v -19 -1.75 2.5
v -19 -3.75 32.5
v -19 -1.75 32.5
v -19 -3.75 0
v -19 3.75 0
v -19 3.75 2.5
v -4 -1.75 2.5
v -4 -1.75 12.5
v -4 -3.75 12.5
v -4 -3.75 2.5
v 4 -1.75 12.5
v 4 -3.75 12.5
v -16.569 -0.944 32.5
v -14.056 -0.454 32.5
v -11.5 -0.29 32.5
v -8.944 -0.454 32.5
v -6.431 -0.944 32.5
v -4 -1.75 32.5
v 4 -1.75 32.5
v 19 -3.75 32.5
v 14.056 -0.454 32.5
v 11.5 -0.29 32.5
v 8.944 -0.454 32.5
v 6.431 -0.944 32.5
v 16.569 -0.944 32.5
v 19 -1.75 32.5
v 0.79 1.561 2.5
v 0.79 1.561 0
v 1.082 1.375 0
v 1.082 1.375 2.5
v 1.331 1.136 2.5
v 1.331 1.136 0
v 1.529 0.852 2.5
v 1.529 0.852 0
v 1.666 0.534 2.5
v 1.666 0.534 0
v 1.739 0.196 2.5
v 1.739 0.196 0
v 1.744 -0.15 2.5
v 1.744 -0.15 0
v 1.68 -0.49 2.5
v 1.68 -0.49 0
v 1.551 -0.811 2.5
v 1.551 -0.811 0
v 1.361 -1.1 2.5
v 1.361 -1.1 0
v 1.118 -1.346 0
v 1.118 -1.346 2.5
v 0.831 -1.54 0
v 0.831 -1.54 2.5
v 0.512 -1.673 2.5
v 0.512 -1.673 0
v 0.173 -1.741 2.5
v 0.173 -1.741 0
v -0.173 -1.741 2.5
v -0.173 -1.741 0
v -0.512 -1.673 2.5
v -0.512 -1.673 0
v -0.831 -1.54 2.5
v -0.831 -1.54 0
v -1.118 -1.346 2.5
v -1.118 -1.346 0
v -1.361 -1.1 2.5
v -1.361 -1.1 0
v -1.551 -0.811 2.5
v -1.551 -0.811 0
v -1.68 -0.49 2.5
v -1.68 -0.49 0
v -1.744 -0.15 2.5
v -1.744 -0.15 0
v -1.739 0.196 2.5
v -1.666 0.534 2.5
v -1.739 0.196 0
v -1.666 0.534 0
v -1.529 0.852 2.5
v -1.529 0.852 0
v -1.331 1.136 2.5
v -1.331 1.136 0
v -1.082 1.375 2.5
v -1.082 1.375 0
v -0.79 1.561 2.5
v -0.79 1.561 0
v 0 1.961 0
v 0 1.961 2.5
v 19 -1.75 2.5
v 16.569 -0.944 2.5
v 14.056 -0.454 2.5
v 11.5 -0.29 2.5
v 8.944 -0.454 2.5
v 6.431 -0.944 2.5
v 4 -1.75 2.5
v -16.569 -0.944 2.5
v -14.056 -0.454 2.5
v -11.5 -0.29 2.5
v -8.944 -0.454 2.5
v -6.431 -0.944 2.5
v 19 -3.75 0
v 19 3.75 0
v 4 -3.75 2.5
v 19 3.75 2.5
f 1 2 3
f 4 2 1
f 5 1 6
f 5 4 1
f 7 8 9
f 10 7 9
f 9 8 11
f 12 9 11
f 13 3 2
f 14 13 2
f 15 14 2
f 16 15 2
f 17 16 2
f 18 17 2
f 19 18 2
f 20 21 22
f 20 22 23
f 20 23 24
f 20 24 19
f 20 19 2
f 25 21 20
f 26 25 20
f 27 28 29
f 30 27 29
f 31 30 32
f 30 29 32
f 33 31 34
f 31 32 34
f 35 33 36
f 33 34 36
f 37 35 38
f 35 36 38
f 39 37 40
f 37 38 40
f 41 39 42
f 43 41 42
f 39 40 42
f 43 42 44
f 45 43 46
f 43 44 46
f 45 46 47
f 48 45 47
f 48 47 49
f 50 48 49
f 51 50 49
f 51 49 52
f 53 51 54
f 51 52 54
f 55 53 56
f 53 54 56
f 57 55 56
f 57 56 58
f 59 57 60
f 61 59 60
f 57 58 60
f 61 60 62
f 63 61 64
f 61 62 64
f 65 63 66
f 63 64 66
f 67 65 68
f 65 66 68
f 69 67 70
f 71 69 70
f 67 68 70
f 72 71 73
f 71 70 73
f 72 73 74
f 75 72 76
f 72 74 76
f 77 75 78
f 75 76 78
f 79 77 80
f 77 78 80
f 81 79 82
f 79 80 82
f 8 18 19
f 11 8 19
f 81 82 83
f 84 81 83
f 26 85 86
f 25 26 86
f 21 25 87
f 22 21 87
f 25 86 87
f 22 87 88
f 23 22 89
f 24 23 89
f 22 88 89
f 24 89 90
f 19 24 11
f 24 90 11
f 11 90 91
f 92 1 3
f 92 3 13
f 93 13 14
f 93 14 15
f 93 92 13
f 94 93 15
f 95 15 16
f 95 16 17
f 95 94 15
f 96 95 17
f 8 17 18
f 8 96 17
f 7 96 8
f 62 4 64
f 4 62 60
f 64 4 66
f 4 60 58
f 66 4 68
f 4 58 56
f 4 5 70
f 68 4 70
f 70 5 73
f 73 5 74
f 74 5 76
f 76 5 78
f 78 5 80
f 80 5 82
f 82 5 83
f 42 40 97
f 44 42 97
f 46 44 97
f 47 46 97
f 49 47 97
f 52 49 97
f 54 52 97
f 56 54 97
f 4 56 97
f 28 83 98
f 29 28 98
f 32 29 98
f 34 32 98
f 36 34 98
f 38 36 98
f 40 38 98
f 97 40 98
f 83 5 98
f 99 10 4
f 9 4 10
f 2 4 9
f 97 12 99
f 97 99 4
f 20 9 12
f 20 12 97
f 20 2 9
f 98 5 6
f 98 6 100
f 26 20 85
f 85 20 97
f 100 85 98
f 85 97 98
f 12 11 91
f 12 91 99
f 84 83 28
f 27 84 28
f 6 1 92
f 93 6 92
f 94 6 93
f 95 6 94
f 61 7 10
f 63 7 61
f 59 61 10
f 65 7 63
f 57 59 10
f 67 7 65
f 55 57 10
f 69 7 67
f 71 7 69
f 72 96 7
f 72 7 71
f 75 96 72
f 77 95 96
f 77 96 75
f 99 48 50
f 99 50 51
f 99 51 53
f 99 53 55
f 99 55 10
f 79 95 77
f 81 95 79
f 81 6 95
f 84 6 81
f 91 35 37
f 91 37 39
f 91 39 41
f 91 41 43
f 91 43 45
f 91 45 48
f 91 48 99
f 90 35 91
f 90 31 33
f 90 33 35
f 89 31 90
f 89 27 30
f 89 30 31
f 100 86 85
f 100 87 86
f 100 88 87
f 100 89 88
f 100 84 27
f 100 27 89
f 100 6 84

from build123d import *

# Parameters (mm, degrees)
SKETCH1_W           = 38
SKETCH1_H           = 7.5
BOSS_EXTRUDE1_DEPTH = 2.5
BOSS_EXTRUDE5_DEPTH = 30
SKETCH7_W           = 8
SKETCH7_H           = 2
BOSS_EXTRUDE6_DEPTH = 20


with BuildPart() as part:
    # Sketch1 → Boss-Extrude1 (new body)
    with BuildSketch(Plane.XY):
        Rectangle(SKETCH1_W, SKETCH1_H)
        with BuildLine():
            Line((0, 1.961391495), (0.790288933, 1.561391495))
            ThreePointArc((0.790288933, 1.561391495), (0, -1.75), (-0.790288933, 1.561391495))
            Line((-0.790288933, 1.561391495), (0, 1.961391495))
        make_face(mode=Mode.SUBTRACT)
    extrude(amount=BOSS_EXTRUDE1_DEPTH)

    # Sketch6 → Boss-Extrude5 (add)
    with BuildSketch(Plane.XY.offset(2.5)):
        with BuildLine():
            Line((-19, -3.75), (-19, -1.75))
            ThreePointArc((-19, -1.75), (-11.5, -0.290496218), (-4, -1.75))
            Line((-4, -1.75), (-4, -3.75))
            Line((-4, -3.75), (-19, -3.75))
        make_face()
    boss_extrude5 = extrude(amount=BOSS_EXTRUDE5_DEPTH)

    # Mirror1: Boss-Extrude5 across plane
    add(boss_extrude5.mirror(Plane(origin=(0, 0, 0), x_dir=(0, 0, 1), z_dir=(1, 0, 0))))

    # Sketch7 → Boss-Extrude6 (add)
    with BuildSketch(Plane.XY.offset(32.5)):
        with Locations((0, -2.75)):
            Rectangle(SKETCH7_W, SKETCH7_H)
    extrude(amount=-BOSS_EXTRUDE6_DEPTH)


solid = part.part
